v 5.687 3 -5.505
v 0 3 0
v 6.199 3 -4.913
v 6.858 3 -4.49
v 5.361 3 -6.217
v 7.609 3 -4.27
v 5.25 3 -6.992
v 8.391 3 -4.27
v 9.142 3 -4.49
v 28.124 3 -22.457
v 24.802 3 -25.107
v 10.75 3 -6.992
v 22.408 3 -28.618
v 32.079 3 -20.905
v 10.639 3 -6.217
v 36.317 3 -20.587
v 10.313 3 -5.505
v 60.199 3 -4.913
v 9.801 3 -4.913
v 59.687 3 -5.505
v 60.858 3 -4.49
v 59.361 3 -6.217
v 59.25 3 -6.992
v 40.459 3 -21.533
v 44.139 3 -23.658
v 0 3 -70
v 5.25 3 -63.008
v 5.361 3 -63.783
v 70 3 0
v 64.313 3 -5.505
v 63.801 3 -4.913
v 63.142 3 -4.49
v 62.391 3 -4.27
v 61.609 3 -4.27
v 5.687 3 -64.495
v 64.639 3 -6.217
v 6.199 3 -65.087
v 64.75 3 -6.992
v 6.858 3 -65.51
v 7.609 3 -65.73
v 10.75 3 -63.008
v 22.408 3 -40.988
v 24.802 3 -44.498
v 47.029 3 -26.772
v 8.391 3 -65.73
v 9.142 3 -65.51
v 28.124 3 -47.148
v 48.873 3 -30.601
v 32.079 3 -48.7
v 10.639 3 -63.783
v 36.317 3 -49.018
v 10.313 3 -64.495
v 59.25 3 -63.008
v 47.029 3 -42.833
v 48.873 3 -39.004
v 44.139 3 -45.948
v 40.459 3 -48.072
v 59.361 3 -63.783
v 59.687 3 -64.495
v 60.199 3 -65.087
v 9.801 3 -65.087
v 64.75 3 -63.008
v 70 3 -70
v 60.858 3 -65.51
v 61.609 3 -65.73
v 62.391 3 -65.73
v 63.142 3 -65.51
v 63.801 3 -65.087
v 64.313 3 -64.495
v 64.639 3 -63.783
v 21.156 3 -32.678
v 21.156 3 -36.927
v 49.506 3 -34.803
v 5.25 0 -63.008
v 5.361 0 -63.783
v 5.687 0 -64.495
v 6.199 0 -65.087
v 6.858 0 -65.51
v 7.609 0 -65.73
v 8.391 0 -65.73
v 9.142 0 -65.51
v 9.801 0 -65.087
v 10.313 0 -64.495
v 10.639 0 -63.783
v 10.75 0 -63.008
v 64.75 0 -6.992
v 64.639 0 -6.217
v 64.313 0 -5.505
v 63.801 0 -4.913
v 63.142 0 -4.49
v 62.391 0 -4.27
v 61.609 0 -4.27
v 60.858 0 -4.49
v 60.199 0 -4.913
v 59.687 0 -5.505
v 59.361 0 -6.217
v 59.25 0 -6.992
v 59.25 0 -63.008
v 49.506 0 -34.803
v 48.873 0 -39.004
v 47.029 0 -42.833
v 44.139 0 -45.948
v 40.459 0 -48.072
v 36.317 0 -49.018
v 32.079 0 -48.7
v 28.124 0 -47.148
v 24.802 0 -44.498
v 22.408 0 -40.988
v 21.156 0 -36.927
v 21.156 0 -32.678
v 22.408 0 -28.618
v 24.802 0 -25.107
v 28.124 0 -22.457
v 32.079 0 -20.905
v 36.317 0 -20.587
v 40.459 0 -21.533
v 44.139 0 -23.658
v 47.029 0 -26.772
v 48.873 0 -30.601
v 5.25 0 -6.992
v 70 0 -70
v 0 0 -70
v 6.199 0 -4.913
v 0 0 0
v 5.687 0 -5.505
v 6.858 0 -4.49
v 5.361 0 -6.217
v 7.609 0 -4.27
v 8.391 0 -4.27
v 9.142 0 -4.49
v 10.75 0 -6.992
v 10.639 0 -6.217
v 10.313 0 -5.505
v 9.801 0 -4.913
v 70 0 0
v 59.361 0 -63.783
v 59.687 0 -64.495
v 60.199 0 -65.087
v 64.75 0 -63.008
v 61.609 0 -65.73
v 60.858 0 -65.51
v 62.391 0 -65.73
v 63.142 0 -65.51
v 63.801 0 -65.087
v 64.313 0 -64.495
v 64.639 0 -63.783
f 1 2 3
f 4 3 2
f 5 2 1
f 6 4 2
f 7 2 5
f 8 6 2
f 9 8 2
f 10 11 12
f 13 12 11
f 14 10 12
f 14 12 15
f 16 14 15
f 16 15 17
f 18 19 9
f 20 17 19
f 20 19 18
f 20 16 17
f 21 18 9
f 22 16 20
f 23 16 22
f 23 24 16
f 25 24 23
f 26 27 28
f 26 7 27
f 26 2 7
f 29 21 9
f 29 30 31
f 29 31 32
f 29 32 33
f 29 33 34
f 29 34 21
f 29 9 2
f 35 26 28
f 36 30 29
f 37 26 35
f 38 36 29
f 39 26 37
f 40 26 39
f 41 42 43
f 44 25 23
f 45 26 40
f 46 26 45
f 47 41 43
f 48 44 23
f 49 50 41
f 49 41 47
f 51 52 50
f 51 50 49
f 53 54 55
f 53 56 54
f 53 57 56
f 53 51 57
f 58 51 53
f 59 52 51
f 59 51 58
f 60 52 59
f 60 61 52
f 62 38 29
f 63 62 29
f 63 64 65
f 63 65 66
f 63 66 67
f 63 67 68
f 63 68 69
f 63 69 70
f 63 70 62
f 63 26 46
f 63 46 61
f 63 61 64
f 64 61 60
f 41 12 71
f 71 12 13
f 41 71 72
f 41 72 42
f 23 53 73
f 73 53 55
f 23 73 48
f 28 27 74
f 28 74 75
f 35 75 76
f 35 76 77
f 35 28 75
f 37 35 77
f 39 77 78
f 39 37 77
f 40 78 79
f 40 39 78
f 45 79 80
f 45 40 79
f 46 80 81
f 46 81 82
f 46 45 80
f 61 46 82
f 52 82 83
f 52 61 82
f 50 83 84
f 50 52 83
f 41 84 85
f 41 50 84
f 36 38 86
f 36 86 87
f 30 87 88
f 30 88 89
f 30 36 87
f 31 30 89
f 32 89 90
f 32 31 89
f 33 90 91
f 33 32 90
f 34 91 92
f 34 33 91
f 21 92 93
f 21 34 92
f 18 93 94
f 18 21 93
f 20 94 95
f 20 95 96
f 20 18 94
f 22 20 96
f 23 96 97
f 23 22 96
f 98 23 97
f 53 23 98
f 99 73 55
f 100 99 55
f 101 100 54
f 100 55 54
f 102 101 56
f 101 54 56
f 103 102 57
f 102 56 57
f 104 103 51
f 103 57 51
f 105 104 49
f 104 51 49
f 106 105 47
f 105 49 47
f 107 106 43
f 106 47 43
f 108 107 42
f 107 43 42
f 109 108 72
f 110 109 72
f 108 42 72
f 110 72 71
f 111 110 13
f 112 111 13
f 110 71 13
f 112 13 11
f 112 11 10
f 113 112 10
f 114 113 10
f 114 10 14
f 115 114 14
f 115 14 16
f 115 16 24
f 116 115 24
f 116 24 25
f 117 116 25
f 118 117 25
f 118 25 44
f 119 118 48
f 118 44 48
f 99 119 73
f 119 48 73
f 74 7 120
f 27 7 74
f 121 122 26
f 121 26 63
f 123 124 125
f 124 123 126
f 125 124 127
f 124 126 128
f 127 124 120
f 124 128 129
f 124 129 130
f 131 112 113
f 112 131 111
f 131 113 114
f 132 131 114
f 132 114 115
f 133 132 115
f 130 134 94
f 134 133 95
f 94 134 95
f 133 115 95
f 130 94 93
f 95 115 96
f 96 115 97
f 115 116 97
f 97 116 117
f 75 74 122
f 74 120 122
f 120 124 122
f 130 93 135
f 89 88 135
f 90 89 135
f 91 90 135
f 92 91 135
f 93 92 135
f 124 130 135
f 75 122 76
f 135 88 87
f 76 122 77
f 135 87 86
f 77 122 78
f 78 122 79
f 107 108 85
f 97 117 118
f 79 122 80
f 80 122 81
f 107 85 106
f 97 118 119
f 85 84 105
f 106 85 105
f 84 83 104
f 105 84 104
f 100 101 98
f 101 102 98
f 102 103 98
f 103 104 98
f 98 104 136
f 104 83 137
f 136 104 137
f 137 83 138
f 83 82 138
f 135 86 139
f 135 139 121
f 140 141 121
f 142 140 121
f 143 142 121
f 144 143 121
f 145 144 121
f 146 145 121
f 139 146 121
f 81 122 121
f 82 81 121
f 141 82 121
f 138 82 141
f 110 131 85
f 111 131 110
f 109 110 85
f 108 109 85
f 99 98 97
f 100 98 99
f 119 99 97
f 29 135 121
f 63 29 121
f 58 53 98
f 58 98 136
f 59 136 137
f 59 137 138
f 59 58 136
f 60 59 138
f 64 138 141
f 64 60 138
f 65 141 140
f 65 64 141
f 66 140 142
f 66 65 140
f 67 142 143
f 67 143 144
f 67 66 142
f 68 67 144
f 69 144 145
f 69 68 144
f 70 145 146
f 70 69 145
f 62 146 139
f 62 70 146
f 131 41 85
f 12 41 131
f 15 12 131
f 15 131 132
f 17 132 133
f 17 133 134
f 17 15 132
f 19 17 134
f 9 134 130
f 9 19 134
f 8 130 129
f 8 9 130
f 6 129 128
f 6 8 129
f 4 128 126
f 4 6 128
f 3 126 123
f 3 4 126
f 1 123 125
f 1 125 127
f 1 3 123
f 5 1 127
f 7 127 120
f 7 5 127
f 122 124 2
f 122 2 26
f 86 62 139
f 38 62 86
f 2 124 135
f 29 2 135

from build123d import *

# Parameters (mm, degrees)
SKETCH1_W           = 70
SKETCH1_H           = 70
BOSS_EXTRUDE1_DEPTH = 3
SKETCH2_R           = 14.255
CUT_EXTRUDE1_DEPTH  = 3


with BuildPart() as part:
    # Sketch1 → Boss-Extrude1 (new body)
    with BuildSketch(Plane(origin=(0, 0, 0), x_dir=(1, 0, 0), z_dir=(0, 1, 0))):
        with Locations((35, 35)):
            Rectangle(SKETCH1_W, SKETCH1_H)
    extrude(amount=BOSS_EXTRUDE1_DEPTH)

    # Sketch2 → Cut-Extrude1 (cut)
    with BuildSketch(Plane(origin=(0, 3, 0), x_dir=(1, 0, 0), z_dir=(0, 1, 0))):
        with Locations((35.251413305, 34.802601327)):
            Circle(SKETCH2_R)
        with BuildLine():
            Line((10.75, 63.008410324), (10.75, 6.991589676))
            ThreePointArc((10.75, 6.991589676), (8, 4.241589676), (5.25, 6.991589676))
            Line((5.25, 6.991589676), (5.25, 63.008410324))
            ThreePointArc((5.25, 63.008410324), (8, 65.758410324), (10.75, 63.008410324))
        make_face()
        with BuildLine():
            Line((64.75, 63.008410324), (64.75, 6.991589676))
            ThreePointArc((64.75, 6.991589676), (62, 4.241589676), (59.25, 6.991589676))
            Line((59.25, 6.991589676), (59.25, 63.008410324))
            ThreePointArc((59.25, 63.008410324), (62, 65.758410324), (64.75, 63.008410324))
        make_face()
    extrude(amount=-CUT_EXTRUDE1_DEPTH, mode=Mode.SUBTRACT)


solid = part.part
